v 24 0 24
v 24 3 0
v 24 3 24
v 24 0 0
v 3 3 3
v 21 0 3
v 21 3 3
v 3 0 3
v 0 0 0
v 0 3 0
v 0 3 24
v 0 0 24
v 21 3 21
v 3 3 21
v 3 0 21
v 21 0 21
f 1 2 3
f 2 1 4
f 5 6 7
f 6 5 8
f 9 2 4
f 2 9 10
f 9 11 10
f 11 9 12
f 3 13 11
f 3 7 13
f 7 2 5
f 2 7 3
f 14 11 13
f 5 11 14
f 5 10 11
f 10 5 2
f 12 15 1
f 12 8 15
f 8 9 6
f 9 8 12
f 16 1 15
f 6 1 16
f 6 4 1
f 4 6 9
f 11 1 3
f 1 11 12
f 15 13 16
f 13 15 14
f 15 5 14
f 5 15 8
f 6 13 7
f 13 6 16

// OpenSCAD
// U-shaped spring clip.
$fn = 60;
eps = 0.02;
clip_w = 24;
clip_h = 24;
clip_t = 3;
union() { cube([clip_w,clip_t,clip_t]); translate([0,0,clip_h-clip_t]) cube([clip_w,clip_t,clip_t]); cube([clip_t,clip_t,clip_h]); translate([clip_w-clip_t,0,0]) cube([clip_t,clip_t,clip_h]); }
